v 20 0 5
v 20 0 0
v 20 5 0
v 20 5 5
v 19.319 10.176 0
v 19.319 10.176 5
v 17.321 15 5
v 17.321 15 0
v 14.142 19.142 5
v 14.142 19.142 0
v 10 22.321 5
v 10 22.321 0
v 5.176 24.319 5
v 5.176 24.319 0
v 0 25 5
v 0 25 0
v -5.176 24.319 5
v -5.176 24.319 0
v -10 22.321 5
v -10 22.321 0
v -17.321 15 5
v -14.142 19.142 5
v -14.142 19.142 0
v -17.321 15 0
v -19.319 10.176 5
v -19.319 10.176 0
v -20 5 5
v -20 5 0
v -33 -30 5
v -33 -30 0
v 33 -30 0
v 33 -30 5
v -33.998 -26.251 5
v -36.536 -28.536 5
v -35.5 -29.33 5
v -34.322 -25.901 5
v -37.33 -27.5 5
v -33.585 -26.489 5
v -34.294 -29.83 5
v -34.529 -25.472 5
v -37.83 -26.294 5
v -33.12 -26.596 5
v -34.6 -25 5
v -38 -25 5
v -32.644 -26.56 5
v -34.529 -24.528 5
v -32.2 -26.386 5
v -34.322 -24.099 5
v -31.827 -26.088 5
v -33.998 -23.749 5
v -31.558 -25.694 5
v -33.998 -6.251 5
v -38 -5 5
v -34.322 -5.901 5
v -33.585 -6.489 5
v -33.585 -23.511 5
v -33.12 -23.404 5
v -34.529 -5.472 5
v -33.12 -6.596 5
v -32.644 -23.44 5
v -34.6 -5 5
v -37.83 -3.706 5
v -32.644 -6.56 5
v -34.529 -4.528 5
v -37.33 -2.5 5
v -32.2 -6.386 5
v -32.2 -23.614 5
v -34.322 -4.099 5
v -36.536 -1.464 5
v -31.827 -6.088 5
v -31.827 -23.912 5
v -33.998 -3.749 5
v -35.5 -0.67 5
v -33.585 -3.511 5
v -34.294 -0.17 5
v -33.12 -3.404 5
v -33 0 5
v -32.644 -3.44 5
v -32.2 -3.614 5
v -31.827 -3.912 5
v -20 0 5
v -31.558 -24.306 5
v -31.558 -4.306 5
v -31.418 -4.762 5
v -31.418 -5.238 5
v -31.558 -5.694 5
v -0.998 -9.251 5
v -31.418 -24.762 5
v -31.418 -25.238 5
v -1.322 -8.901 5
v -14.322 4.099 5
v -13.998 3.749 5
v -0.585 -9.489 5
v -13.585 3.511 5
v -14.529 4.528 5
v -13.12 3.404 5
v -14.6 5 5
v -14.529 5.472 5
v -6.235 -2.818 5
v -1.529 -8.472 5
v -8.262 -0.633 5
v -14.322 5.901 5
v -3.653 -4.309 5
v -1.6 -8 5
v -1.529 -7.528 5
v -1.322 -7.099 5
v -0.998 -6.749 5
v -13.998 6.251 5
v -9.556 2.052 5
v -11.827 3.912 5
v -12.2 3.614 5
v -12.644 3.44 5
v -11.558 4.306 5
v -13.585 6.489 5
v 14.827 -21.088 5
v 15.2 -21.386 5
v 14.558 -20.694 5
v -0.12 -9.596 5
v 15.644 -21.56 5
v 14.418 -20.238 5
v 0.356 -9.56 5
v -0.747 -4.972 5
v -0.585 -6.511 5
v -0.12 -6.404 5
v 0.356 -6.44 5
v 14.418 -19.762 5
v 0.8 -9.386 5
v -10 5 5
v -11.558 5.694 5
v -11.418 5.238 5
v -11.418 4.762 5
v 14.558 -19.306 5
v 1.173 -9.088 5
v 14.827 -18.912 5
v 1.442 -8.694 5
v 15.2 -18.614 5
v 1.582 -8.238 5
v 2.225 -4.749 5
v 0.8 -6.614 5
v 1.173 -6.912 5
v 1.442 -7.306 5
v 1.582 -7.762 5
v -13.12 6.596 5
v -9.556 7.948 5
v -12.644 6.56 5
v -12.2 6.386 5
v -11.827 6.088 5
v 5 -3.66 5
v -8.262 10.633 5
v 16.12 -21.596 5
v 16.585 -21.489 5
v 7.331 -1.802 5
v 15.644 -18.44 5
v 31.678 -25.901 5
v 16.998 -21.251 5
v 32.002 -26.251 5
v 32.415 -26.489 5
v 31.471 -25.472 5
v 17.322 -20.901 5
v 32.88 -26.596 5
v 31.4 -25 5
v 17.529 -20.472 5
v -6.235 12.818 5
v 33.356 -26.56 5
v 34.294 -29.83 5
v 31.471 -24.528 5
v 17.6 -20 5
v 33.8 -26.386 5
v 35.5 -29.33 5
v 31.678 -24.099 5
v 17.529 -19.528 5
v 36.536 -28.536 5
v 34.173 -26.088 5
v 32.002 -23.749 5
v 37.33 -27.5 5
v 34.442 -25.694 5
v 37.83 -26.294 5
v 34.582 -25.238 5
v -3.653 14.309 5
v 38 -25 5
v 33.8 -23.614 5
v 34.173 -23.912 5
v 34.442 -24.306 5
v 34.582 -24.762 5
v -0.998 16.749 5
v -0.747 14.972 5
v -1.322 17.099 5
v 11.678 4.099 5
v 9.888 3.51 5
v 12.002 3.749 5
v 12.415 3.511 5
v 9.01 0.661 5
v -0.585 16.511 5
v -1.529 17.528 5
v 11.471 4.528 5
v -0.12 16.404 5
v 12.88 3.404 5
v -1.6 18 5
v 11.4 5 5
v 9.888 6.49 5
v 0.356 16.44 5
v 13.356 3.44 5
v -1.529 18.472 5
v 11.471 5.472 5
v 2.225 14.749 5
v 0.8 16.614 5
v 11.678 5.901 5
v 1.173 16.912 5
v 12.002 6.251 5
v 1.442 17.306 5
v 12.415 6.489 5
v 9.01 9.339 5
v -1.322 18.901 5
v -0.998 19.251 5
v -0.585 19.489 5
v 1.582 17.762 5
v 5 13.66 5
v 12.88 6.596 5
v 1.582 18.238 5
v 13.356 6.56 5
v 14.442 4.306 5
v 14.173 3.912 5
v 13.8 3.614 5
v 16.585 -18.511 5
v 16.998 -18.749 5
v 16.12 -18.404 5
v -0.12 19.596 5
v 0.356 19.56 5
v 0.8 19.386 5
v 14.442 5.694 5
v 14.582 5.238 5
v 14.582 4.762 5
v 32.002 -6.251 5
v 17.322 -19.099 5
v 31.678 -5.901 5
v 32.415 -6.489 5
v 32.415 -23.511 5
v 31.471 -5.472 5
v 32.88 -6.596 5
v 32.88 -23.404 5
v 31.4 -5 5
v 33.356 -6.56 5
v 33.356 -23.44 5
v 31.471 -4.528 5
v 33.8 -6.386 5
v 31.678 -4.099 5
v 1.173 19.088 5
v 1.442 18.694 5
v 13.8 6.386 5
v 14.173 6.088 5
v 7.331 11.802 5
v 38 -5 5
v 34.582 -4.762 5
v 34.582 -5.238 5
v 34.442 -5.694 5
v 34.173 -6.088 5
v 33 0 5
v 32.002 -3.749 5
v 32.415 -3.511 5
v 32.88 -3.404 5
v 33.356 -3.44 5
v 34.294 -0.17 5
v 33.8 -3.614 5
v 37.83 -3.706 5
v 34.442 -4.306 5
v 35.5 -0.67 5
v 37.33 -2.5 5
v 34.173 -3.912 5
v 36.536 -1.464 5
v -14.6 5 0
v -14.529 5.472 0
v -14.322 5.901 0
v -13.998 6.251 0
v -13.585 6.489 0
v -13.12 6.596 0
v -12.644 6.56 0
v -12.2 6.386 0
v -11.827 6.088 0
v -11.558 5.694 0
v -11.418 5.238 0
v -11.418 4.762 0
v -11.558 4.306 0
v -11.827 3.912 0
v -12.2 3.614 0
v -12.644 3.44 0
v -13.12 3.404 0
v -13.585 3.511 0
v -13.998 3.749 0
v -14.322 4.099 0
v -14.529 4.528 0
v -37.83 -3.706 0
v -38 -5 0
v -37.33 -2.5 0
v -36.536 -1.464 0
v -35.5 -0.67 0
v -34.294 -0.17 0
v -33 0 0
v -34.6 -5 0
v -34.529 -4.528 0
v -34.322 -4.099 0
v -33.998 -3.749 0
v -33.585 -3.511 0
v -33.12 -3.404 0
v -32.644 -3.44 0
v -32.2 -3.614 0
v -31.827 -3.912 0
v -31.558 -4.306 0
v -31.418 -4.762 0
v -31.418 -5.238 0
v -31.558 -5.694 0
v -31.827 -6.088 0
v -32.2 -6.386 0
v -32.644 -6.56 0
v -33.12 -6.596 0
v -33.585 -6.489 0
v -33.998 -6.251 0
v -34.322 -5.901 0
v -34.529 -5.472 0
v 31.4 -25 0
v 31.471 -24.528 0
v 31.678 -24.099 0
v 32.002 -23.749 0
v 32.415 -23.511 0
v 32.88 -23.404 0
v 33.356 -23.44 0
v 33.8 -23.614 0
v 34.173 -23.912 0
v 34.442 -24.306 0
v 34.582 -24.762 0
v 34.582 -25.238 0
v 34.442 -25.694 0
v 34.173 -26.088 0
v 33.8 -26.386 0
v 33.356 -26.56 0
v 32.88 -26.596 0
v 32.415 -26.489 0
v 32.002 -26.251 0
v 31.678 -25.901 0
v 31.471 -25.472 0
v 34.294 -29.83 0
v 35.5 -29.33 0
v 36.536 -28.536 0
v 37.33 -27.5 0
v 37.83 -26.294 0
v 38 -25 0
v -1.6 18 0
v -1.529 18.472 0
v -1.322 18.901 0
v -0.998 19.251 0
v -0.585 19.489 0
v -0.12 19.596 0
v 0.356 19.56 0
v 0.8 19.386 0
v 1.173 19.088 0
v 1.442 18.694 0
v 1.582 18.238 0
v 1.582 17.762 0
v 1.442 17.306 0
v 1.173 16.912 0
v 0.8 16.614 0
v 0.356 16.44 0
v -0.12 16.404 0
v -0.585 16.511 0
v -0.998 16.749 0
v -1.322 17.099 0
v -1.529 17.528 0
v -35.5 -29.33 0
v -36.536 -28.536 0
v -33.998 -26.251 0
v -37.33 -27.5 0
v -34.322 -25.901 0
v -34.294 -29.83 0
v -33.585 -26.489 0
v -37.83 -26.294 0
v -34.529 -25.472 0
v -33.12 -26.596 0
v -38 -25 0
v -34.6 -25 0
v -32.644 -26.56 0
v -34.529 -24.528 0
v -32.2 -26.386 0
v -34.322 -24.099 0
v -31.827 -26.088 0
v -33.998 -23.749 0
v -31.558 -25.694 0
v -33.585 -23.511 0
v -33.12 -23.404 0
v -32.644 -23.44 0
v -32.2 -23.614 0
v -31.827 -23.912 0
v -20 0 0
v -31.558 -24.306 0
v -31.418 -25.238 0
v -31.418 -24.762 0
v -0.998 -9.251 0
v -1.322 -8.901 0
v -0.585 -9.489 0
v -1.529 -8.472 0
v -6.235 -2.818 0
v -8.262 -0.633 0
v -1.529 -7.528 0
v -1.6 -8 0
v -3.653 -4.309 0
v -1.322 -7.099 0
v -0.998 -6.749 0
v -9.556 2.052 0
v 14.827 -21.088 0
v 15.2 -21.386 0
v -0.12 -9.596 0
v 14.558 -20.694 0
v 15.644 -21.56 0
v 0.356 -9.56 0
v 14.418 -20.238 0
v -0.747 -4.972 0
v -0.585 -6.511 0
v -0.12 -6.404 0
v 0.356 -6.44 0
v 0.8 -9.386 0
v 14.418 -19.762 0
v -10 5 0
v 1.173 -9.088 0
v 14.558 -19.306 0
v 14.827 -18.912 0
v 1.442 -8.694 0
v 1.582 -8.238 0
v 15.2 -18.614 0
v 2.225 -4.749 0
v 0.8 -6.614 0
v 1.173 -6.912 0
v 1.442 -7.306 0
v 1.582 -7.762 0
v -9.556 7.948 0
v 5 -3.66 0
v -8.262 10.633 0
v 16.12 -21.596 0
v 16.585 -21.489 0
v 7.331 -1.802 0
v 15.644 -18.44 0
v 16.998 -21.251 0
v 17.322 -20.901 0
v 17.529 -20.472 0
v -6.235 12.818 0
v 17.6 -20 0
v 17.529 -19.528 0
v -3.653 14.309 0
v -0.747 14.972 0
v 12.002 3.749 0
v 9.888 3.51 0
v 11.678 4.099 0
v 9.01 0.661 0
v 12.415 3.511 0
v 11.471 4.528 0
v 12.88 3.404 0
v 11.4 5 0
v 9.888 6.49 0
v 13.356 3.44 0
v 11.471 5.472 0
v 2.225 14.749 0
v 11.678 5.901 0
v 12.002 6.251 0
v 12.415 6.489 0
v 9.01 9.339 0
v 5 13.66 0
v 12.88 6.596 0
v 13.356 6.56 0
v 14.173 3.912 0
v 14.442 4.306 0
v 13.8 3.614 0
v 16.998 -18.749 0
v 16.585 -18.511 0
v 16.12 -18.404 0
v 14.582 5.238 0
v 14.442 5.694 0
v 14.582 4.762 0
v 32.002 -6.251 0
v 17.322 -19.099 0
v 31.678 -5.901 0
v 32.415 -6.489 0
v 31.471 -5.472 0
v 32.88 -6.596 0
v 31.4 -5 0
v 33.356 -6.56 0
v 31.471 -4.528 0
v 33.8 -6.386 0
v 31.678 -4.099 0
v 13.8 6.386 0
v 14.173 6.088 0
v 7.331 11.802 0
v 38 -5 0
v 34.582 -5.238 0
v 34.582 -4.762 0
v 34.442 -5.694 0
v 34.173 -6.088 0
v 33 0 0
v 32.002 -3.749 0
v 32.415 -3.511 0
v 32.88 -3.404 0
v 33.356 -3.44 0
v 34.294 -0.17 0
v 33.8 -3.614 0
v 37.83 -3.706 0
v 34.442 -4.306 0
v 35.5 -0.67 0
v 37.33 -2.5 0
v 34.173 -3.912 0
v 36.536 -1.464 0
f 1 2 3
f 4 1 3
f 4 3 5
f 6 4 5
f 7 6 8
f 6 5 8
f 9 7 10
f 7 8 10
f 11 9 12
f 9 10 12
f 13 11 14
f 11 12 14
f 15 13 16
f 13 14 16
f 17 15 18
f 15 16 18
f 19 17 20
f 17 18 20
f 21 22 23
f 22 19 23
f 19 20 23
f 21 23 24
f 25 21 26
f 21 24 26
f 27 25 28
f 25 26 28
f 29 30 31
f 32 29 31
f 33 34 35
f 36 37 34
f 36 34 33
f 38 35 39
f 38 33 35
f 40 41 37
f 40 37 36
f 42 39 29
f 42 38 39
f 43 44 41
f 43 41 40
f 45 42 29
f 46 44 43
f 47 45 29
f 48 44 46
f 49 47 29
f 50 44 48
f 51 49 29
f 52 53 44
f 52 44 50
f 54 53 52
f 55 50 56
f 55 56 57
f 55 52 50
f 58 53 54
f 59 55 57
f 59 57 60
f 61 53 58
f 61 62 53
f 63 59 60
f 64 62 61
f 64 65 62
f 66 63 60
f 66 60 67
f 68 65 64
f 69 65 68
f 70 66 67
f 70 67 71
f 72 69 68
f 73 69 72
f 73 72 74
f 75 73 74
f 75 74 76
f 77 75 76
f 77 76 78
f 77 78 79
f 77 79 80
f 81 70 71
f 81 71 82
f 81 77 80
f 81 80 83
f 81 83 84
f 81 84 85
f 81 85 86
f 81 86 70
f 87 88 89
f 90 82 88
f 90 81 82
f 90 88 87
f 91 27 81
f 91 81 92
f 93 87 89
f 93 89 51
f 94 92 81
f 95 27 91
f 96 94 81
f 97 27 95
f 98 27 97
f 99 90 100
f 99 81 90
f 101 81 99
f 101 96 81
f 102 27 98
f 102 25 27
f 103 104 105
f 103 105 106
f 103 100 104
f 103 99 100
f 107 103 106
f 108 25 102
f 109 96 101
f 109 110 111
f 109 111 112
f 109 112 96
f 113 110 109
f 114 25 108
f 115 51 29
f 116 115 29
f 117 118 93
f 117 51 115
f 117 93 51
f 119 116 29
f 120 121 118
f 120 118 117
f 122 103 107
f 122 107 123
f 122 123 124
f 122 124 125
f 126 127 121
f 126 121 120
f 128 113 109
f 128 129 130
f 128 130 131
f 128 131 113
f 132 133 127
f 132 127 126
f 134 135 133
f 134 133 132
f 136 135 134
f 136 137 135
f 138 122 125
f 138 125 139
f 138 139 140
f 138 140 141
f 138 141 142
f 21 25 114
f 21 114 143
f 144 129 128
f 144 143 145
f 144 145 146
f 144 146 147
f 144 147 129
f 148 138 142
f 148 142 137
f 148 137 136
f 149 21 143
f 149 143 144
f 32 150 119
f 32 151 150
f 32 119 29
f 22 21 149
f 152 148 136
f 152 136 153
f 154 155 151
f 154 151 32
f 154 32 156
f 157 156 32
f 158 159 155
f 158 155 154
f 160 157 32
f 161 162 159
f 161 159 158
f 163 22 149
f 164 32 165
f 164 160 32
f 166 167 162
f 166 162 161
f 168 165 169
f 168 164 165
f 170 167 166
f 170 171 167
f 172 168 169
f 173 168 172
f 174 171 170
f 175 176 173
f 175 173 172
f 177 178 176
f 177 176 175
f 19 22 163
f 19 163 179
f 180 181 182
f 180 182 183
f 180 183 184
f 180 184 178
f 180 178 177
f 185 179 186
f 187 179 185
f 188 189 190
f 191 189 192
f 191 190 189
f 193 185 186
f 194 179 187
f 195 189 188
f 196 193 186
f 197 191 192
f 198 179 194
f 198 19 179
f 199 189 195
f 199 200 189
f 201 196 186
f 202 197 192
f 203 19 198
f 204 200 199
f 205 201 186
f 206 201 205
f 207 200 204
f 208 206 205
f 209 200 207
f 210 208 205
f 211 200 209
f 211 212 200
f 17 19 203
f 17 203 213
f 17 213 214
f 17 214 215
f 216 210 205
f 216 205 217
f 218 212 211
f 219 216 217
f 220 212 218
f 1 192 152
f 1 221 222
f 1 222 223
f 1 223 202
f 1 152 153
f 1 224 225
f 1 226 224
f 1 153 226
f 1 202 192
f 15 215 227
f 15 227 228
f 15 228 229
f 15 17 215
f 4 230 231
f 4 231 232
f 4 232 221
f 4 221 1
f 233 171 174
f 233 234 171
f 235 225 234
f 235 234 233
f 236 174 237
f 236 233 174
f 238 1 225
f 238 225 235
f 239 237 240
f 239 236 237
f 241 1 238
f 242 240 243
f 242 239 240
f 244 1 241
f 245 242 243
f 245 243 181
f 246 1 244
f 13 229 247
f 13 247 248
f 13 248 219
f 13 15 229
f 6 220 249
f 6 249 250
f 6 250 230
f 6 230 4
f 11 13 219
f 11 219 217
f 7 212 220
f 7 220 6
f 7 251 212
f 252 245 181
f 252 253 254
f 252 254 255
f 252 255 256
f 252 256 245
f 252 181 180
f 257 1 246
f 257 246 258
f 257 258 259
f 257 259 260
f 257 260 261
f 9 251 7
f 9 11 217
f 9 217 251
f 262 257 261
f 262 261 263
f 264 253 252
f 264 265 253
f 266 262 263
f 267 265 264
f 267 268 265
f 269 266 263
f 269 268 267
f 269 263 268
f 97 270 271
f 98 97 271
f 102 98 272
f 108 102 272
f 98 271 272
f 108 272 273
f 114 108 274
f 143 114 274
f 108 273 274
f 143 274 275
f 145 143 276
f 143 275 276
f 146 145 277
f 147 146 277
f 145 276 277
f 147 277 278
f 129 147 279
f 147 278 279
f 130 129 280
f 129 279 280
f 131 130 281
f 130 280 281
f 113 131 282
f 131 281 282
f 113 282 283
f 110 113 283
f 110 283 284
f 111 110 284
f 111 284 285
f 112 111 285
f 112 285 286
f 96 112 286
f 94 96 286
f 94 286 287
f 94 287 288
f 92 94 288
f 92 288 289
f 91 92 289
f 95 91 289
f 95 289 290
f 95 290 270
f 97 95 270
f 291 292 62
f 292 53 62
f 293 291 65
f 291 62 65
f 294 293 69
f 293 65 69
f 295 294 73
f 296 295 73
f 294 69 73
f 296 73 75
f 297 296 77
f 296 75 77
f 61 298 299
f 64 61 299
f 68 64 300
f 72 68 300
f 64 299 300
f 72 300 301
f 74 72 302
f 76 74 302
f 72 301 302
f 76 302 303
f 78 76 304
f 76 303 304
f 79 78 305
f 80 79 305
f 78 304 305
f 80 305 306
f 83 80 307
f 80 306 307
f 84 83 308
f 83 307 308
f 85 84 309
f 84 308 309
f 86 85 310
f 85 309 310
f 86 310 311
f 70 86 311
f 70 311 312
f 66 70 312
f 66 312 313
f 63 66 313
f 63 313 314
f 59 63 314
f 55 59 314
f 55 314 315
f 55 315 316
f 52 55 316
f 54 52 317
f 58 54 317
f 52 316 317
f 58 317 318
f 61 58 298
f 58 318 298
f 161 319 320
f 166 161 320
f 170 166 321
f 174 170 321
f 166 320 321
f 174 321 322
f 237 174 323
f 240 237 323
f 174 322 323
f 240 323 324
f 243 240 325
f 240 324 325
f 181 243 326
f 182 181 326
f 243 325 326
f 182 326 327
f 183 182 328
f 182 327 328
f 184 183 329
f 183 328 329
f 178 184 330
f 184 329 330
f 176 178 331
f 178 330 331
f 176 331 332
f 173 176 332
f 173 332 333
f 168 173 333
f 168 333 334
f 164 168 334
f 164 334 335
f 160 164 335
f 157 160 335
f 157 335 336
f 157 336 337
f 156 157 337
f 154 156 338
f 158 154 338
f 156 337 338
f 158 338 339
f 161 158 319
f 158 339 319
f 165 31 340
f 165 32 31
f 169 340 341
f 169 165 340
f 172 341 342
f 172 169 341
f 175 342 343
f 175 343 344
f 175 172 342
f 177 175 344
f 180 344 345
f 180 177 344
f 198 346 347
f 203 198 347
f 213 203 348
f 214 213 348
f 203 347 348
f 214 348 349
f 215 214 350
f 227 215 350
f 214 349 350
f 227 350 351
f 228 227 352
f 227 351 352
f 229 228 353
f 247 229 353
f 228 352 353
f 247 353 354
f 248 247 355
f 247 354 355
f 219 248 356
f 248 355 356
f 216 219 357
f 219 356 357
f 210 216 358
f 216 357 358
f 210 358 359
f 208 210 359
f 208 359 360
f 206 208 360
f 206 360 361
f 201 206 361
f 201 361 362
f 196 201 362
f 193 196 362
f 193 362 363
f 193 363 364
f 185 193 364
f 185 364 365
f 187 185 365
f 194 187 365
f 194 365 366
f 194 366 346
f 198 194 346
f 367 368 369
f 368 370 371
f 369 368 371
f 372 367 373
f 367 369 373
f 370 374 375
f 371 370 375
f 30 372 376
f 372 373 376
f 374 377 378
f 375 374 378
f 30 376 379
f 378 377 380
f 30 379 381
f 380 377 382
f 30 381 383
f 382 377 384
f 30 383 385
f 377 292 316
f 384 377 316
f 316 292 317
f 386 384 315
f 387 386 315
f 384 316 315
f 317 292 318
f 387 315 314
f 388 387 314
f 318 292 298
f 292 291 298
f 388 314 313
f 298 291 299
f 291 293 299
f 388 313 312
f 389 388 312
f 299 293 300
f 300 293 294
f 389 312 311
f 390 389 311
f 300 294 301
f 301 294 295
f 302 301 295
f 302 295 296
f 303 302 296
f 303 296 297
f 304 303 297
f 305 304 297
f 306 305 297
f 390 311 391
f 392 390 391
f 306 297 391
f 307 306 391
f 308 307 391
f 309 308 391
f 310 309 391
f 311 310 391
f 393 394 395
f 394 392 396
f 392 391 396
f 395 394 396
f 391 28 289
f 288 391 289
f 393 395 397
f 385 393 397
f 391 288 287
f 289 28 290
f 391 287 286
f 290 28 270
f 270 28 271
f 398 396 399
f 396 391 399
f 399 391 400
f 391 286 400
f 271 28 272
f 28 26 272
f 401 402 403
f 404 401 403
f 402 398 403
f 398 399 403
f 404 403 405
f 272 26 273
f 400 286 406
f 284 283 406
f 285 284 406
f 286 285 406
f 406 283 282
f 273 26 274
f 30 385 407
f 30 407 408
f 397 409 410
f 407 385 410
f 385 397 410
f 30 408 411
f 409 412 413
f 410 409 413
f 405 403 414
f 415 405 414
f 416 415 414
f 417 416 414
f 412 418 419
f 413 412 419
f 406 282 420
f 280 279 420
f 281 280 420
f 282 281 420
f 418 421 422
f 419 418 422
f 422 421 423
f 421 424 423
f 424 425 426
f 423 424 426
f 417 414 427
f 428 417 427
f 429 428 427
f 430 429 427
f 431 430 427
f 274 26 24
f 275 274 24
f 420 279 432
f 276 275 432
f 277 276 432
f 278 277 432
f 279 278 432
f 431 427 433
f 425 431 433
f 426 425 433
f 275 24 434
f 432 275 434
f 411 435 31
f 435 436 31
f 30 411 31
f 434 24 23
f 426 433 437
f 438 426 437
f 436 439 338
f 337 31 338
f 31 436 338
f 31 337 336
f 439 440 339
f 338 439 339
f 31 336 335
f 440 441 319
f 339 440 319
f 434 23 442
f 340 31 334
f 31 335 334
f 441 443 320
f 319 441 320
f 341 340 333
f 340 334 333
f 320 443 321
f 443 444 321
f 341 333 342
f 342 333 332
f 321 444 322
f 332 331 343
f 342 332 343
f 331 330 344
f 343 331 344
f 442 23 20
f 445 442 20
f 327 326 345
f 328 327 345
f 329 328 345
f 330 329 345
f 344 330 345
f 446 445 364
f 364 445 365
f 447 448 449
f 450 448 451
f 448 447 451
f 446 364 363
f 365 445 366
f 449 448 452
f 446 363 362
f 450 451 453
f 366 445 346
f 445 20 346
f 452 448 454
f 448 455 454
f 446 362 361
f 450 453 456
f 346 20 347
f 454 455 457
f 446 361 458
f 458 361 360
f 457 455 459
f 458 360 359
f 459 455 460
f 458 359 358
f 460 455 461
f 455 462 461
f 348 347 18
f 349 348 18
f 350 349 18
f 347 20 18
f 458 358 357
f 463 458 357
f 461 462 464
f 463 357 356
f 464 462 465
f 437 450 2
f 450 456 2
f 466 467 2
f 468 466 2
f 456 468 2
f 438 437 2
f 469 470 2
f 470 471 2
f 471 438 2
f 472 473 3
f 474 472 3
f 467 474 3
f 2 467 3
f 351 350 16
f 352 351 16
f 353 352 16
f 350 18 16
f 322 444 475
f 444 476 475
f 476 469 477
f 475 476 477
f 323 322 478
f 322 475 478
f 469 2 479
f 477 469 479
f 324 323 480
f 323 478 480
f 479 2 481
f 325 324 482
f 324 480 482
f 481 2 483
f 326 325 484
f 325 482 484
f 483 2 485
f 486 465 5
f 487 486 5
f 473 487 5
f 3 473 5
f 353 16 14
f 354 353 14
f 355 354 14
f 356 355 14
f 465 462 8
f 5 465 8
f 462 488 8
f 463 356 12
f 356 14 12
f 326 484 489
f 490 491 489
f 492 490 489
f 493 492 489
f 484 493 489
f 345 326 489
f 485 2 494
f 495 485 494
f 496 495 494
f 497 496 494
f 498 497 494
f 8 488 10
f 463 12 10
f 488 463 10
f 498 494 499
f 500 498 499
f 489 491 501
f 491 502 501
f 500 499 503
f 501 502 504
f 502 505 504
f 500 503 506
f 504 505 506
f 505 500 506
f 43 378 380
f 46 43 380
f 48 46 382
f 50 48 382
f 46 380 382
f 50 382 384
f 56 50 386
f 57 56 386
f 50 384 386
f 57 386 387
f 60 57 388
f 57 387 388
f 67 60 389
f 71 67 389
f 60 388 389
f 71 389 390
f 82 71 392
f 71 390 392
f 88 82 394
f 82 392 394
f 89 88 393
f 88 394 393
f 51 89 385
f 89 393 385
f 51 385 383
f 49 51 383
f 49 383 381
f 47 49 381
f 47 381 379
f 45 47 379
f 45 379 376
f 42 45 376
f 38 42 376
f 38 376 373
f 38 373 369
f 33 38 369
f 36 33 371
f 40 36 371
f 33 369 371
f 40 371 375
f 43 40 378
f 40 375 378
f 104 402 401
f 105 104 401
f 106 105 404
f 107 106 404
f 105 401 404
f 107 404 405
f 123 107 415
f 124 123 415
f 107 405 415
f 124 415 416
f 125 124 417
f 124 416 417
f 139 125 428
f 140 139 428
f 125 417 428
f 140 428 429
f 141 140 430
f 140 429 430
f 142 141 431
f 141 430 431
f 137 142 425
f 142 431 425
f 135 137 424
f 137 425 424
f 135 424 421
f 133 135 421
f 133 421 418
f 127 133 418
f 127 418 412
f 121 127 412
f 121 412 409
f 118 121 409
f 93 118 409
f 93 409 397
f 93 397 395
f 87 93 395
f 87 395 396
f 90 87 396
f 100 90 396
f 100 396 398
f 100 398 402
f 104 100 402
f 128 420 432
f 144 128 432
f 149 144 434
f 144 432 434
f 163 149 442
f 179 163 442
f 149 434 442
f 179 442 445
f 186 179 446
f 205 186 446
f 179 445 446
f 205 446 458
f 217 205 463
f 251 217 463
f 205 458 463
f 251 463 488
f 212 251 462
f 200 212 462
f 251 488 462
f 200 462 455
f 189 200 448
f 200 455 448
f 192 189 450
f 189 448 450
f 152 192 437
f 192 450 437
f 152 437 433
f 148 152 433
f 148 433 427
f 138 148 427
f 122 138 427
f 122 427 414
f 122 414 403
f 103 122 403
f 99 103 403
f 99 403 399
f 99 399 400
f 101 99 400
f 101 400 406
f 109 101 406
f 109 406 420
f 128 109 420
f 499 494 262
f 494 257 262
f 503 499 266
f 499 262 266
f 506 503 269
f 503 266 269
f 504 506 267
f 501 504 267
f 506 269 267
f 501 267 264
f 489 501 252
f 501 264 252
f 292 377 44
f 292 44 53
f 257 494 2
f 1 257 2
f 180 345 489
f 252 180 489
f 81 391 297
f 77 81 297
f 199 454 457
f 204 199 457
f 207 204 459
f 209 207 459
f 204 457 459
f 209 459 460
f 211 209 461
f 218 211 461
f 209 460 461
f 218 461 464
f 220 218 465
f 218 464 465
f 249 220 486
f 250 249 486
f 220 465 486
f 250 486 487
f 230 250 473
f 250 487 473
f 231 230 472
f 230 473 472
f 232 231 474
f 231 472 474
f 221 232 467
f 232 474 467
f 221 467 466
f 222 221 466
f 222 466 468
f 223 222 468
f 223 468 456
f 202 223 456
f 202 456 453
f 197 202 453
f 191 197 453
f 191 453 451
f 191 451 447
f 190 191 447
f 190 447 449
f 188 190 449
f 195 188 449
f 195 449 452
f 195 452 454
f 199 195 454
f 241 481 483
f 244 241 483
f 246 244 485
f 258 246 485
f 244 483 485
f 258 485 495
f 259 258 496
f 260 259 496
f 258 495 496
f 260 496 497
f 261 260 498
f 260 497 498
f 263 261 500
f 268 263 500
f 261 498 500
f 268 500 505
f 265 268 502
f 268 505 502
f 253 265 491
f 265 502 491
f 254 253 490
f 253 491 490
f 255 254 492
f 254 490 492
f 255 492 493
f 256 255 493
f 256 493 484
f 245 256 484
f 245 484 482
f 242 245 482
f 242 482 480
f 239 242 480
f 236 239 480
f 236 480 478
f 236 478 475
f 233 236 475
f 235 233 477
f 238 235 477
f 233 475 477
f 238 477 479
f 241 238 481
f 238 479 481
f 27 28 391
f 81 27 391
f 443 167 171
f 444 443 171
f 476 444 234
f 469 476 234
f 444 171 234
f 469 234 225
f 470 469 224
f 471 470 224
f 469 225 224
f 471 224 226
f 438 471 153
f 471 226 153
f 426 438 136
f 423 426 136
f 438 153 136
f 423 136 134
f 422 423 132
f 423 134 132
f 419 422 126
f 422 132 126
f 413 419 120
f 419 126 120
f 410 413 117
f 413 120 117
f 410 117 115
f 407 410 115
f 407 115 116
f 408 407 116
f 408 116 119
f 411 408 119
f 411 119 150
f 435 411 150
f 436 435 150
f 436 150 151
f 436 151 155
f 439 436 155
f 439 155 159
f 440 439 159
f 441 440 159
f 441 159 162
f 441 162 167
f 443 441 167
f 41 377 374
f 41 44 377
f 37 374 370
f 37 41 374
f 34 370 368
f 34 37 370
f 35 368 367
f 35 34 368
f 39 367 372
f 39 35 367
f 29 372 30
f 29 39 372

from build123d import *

# Parameters (mm, degrees)
SKETCH_1_W           = 76
SKETCH_1_H           = 60
EXTRUDE_1_DEPTH      = 5
FILLET_1_R           = 5
SKETCH_4_R           = 1.6
CUT_EXTRUDE_3_DEPTH  = 5
SKETCH_11_R          = 10
SKETCH_11_R_2        = 1.6
CUT_EXTRUDE_11_DEPTH = 10
CUT_EXTRUDE_12_DEPTH = 13.5
FILLET_2_R           = 5
SKETCH_13_R          = 1.6
CUT_EXTRUDE_13_DEPTH = 49.672374095


with BuildPart() as part:
    # ｽｹｯﾁ1 → ﾎﾞｽ - 押し出し1 (new body)
    with BuildSketch(Plane.XY):
        Rectangle(SKETCH_1_W, SKETCH_1_H)
    extrude(amount=EXTRUDE_1_DEPTH)

    # ﾌｨﾚｯﾄ1
    fillet_1_edges = [part.edges().sort_by_distance(p)[0] for p in [
        (38, -30, 2.5),
        (-38, -30, 2.5),
        (-38, 30, 2.5),
        (38, 30, 2.5),
    ]]
    fillet(fillet_1_edges, radius=FILLET_1_R)

    # ｽｹｯﾁ4 → ｶｯﾄ - 押し出し3 (cut)
    with BuildSketch(Plane(origin=(0, 0, 0), x_dir=(-1, 0, 0), z_dir=(0, 0, -1))):
        with Locations((-33, -5)):
            Circle(SKETCH_4_R)
        with Locations((-33, -25)):
            Circle(SKETCH_4_R)
        with Locations((33, -5)):
            Circle(SKETCH_4_R)
        with Locations((33, -25)):
            Circle(SKETCH_4_R)
    extrude(amount=-CUT_EXTRUDE_3_DEPTH, mode=Mode.SUBTRACT)

    # ｽｹｯﾁ11 → ｶｯﾄ - 押し出し11 (cut)
    with BuildSketch(Plane(origin=(0, 0, 0), x_dir=(-1, 0, 0), z_dir=(0, 0, -1))):
        with Locations((0, 5)):
            Circle(SKETCH_11_R)
        with Locations((0, 18)):
            Circle(SKETCH_11_R_2)
        with Locations((13, 5)):
            Circle(SKETCH_11_R_2)
        with Locations((0, -8)):
            Circle(SKETCH_11_R_2)
        with Locations((-13, 5)):
            Circle(SKETCH_11_R_2)
    extrude(amount=-CUT_EXTRUDE_11_DEPTH, mode=Mode.SUBTRACT)

    # ｽｹｯﾁ12 → ｶｯﾄ - 押し出し12 (cut)
    with BuildSketch(Plane(origin=(0, 0, 0), x_dir=(-1, 0, 0), z_dir=(0, 0, -1))):
        with BuildLine():
            Line((-38, 0), (-20, 0))
            Line((-20, 0), (-20, 5))
            ThreePointArc((-20, 5), (0, 25), (20, 5))
            Line((20, 5), (20, 0))
            Line((20, 0), (38, 0))
            Line((38, 0), (38, 30))
            Line((38, 30), (-38, 30))
            Line((-38, 30), (-38, 0))
        make_face()
    extrude(amount=-CUT_EXTRUDE_12_DEPTH, mode=Mode.SUBTRACT)

    # ﾌｨﾚｯﾄ2
    fillet_2_edges = [part.edges().sort_by_distance(p)[0] for p in [
        (-38, 0, 2.5),
        (38, 0, 2.5),
    ]]
    fillet(fillet_2_edges, radius=FILLET_2_R)

    # ｽｹｯﾁ13 → ｶｯﾄ - 押し出し13 (cut, through all)
    with BuildSketch(Plane.XY.offset(5)):
        with Locations((16, -20)):
            Circle(SKETCH_13_R)
    extrude(amount=-CUT_EXTRUDE_13_DEPTH, mode=Mode.SUBTRACT)


solid = part.part
